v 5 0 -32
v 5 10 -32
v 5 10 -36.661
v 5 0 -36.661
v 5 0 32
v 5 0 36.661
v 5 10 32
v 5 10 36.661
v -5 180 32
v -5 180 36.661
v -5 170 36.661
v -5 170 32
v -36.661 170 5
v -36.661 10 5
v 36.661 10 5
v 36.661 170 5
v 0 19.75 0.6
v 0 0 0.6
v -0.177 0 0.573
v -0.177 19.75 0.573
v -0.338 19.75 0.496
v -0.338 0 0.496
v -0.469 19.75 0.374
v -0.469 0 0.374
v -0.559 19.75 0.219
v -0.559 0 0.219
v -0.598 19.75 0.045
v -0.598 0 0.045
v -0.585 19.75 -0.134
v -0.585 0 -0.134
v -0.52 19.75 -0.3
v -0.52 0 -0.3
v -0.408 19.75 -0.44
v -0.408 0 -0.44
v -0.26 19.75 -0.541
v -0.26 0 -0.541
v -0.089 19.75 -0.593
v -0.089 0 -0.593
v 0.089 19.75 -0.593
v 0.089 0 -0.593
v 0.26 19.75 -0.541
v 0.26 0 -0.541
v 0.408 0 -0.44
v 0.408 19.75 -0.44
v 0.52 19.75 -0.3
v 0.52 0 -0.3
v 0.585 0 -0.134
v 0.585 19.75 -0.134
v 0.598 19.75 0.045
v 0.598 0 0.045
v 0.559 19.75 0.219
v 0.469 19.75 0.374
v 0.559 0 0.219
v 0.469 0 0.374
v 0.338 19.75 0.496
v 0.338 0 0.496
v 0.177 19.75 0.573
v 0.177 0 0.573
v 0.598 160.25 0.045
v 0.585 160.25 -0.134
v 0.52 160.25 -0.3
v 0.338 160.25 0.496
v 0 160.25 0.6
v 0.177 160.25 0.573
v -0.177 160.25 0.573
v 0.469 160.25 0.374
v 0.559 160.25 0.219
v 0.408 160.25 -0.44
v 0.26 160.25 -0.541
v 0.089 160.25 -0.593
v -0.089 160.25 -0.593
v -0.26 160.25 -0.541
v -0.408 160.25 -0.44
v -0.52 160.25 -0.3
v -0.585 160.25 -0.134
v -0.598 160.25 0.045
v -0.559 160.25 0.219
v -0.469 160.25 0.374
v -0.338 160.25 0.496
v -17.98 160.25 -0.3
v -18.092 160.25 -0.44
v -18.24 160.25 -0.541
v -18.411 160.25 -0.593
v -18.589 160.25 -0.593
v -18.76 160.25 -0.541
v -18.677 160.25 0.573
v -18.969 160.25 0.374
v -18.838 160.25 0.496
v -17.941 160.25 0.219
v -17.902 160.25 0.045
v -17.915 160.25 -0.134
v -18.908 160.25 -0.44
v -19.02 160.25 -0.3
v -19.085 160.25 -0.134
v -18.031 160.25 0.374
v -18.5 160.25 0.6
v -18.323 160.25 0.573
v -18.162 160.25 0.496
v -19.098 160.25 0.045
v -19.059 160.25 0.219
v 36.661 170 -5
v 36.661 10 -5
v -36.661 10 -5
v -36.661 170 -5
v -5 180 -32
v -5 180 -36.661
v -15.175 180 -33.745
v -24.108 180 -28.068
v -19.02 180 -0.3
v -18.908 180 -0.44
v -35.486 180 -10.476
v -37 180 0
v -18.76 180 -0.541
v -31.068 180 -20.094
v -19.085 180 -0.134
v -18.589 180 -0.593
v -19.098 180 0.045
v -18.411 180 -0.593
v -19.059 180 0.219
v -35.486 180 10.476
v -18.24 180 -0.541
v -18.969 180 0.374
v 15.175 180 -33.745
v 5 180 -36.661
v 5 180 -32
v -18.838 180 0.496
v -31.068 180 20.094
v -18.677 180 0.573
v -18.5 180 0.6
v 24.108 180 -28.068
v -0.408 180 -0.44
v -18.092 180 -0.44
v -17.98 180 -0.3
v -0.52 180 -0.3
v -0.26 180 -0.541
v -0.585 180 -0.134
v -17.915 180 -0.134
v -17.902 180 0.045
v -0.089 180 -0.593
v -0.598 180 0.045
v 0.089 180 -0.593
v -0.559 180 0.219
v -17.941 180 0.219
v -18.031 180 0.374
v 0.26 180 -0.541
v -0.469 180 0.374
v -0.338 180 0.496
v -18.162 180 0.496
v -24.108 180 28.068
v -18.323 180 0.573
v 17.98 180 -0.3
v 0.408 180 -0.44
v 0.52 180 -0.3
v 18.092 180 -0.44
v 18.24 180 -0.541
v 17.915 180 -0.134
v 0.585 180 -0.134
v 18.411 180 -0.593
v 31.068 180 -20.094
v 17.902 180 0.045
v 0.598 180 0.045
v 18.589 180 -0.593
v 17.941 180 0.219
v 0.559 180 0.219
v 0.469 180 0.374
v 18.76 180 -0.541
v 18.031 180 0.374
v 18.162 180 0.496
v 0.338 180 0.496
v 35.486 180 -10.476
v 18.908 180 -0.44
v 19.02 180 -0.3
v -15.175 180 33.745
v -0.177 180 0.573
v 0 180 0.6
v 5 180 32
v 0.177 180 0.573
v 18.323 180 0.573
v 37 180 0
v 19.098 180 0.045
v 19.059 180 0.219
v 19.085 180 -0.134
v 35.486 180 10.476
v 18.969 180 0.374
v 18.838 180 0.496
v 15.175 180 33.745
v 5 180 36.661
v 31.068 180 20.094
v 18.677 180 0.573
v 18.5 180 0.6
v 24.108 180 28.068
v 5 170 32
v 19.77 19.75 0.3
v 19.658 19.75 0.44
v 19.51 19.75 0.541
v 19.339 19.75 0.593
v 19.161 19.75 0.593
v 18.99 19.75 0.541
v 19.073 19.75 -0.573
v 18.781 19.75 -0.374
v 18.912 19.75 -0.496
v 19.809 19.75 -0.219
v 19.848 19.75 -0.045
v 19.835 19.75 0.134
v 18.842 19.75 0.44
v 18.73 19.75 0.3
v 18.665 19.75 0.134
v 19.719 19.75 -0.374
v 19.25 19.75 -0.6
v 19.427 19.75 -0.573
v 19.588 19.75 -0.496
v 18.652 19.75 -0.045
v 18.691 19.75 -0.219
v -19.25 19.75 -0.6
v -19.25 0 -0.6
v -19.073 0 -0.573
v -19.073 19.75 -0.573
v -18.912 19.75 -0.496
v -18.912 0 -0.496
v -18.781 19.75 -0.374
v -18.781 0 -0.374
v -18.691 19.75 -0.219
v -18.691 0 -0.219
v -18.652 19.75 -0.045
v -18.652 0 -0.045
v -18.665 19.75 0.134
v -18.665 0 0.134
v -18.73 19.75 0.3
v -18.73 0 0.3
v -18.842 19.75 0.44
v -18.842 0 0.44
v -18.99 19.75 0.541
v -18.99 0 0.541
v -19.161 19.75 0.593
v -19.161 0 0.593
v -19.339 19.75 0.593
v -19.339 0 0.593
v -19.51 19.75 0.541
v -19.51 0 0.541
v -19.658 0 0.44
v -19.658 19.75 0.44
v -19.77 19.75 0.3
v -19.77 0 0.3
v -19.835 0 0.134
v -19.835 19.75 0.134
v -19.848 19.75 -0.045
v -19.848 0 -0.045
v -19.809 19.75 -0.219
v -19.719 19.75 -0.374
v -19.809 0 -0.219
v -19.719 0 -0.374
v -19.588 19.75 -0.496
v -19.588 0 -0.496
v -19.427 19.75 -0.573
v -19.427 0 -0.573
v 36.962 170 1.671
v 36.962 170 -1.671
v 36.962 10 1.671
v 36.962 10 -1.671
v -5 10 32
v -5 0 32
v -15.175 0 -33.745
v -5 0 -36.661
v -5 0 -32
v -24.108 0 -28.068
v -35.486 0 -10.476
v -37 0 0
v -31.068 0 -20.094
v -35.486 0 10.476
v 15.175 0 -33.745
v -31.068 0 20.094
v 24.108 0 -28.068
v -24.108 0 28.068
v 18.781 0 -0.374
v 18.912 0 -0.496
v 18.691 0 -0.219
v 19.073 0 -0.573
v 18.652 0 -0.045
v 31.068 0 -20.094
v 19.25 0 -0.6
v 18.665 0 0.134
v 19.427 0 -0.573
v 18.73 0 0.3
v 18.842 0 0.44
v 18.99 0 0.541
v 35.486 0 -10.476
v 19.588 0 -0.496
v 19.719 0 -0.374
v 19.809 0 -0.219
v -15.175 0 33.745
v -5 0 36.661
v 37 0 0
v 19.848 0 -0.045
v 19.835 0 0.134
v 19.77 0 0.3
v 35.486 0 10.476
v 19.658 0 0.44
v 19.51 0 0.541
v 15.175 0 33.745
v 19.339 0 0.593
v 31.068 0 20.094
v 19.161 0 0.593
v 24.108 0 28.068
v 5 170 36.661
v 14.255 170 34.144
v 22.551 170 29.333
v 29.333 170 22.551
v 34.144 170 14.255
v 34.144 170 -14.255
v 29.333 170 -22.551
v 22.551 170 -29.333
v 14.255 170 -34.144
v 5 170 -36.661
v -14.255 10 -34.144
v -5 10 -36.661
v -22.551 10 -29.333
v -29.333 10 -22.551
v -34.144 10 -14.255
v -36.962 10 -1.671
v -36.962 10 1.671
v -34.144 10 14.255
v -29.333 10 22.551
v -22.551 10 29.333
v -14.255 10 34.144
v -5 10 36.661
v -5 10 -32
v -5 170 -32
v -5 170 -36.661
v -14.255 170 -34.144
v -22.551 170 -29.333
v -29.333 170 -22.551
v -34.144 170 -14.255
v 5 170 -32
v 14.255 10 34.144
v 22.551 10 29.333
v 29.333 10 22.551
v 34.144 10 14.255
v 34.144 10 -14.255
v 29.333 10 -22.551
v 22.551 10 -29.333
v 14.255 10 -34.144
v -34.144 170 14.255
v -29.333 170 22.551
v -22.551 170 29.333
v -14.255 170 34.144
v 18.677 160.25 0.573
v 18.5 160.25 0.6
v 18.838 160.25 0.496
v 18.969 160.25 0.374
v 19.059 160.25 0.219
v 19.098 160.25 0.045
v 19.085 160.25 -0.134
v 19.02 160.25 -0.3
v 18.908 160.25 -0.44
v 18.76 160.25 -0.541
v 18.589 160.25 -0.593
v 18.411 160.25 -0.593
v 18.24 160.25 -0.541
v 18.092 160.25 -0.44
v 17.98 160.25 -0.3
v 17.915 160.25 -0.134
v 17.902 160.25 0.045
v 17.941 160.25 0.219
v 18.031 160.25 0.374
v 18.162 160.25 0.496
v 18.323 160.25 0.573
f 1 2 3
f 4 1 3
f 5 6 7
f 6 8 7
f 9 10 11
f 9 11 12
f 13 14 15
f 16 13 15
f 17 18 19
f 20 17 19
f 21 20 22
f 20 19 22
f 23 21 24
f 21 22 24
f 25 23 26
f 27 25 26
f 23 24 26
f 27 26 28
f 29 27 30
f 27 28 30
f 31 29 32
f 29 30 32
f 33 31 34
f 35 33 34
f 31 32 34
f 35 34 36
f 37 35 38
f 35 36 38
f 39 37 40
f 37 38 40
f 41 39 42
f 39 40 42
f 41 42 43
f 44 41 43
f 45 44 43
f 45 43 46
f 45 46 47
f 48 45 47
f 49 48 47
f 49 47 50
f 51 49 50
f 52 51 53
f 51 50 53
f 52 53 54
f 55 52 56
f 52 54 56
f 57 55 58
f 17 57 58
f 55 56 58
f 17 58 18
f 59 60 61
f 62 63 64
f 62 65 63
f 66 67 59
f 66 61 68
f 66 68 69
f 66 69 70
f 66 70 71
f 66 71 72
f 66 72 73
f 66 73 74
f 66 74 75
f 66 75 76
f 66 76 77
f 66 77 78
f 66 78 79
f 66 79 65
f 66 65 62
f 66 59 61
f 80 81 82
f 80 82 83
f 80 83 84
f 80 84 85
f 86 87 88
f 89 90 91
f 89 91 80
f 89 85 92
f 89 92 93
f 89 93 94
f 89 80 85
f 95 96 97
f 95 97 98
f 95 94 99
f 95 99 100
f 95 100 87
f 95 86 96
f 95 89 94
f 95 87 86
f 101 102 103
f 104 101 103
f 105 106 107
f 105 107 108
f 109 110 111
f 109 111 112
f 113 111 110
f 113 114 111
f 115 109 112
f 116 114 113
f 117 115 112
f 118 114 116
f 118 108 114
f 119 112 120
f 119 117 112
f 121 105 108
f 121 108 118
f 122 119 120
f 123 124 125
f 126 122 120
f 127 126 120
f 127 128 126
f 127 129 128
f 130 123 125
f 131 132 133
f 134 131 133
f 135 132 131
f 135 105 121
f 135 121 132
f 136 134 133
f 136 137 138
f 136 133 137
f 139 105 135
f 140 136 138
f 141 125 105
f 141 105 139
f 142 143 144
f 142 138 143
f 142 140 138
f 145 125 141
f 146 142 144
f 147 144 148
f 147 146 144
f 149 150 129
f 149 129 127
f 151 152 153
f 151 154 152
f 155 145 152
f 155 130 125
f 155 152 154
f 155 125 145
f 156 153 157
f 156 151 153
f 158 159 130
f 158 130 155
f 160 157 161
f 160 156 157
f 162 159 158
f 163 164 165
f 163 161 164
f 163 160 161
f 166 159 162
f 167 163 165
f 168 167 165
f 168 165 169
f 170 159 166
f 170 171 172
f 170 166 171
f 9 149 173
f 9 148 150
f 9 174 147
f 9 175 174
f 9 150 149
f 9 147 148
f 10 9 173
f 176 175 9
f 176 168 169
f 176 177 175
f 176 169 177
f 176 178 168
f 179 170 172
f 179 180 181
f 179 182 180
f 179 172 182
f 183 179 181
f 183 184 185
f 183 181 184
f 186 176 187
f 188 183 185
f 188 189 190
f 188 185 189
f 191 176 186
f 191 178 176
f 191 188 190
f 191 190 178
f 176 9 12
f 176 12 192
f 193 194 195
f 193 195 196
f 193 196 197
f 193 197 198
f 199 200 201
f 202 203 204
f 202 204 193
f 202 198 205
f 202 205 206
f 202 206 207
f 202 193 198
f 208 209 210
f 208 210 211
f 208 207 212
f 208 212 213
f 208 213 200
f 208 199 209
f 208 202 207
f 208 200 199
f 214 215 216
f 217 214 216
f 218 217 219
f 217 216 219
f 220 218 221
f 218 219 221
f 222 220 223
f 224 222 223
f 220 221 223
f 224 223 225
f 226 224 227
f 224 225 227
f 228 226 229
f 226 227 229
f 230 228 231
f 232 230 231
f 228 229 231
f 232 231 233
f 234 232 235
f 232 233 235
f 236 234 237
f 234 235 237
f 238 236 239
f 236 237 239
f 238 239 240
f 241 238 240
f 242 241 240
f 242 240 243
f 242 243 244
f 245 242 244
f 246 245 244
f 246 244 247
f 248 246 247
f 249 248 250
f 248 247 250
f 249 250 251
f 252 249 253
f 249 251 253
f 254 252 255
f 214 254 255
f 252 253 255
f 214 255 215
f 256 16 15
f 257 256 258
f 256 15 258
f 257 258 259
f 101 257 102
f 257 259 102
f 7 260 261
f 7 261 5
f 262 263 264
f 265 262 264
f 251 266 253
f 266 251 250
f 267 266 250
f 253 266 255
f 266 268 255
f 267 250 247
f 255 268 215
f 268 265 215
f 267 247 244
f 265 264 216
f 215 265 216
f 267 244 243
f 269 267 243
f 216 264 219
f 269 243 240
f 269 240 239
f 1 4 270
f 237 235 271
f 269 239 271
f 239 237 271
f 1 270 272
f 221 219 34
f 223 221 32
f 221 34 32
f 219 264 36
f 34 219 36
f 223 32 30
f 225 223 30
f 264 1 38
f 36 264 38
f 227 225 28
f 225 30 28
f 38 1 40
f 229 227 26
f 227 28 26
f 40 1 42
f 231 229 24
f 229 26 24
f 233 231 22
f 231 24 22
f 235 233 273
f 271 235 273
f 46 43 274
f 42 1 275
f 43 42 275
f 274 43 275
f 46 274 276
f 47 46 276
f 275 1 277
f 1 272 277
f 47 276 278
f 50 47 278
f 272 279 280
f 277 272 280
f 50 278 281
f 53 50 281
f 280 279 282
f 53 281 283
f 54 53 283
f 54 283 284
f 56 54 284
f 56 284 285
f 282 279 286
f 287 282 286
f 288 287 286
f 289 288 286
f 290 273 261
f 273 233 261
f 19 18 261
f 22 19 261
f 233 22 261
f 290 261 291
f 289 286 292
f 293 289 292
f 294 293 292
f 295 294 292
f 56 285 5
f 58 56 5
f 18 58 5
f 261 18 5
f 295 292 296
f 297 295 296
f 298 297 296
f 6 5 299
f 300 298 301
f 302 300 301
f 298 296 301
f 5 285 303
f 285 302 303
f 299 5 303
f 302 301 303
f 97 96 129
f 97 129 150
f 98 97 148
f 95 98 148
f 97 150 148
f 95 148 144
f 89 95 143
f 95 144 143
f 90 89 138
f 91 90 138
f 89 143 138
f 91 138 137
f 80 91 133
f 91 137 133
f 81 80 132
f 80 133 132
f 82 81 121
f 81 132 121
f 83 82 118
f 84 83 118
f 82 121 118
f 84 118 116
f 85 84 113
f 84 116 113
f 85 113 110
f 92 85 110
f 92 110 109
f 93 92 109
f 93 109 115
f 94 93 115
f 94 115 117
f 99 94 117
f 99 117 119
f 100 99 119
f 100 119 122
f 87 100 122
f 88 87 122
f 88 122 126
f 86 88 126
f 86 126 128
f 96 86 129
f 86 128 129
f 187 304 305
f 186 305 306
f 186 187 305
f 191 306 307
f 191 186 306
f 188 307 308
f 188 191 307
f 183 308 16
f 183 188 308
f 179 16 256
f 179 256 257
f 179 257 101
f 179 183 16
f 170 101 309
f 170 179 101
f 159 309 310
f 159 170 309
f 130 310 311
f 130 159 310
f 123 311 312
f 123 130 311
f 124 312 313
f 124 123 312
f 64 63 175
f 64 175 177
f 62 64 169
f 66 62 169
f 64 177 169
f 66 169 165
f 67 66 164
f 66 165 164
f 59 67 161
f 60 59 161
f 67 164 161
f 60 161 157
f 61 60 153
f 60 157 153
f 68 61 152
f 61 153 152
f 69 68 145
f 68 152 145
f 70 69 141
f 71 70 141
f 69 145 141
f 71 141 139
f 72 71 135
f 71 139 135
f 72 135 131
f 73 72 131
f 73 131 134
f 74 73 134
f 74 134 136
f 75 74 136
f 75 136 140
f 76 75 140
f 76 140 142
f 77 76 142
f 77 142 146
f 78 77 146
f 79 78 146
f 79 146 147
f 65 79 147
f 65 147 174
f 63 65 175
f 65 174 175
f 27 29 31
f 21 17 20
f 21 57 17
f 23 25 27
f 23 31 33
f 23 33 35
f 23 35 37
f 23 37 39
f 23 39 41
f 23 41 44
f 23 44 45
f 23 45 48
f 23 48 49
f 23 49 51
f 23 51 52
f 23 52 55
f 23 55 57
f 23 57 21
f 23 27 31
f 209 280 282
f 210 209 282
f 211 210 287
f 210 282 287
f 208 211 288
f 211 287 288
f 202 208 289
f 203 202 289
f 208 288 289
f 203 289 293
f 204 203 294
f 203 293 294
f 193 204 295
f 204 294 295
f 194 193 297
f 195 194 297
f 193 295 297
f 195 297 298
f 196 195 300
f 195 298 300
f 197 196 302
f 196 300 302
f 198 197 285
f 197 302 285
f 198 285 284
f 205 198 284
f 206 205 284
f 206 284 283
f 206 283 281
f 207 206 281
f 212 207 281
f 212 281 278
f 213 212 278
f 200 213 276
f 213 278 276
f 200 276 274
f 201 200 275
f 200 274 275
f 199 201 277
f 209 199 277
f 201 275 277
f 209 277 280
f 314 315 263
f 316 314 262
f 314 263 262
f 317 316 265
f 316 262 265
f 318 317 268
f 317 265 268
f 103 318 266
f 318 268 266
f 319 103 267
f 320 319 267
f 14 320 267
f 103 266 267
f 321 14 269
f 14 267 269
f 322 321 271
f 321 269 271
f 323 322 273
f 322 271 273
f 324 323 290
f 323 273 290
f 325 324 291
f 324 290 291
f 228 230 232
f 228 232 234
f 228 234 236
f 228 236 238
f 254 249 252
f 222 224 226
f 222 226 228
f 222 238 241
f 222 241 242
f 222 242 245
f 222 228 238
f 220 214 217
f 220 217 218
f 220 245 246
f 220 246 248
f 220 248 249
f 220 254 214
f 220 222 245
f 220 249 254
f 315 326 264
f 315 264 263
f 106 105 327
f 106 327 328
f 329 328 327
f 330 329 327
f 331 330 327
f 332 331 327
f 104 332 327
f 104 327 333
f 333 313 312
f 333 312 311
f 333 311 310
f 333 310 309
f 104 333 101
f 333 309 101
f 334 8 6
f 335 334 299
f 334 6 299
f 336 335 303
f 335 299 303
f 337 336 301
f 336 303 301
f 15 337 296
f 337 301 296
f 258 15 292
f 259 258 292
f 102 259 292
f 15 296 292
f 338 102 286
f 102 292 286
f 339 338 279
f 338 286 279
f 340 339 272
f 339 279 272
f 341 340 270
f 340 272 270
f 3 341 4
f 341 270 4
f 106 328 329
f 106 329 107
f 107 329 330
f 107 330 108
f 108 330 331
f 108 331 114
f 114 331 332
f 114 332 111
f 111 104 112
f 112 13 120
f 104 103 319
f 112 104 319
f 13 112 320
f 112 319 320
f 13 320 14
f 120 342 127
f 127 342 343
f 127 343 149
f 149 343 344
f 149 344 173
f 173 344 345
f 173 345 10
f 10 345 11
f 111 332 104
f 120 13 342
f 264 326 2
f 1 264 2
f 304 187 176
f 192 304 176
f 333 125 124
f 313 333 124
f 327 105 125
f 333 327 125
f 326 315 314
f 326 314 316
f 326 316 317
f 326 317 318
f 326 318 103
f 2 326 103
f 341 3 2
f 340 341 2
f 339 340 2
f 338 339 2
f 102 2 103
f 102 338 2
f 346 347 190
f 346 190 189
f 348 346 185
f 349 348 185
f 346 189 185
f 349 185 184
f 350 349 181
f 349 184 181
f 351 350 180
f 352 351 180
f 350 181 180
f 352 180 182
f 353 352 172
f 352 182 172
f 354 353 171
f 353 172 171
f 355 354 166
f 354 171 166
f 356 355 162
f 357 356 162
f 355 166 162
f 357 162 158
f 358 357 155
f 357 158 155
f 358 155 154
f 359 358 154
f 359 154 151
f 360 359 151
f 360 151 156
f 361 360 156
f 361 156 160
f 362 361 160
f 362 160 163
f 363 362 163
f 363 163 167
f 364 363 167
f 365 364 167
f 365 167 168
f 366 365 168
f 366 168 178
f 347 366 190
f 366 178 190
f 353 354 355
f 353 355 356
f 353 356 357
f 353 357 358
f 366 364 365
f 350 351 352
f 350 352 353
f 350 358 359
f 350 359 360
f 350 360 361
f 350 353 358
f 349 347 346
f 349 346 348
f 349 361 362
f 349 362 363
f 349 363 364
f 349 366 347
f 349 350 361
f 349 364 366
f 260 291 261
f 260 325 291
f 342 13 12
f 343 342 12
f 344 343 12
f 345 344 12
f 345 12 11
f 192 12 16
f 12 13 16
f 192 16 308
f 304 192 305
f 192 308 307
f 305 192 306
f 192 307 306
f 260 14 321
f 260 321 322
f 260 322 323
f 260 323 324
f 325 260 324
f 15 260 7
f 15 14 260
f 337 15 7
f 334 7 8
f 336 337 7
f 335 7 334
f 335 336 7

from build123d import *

# Parameters (mm, degrees)
SKETCH1_R           = 37
BOSS_EXTRUDE1_DEPTH = 10
SKETCH2_R           = 37
BOSS_EXTRUDE2_DEPTH = 10
BOSS_EXTRUDE3_REACH = 179.871
SKETCH4_W           = 10
SKETCH4_H           = 10
CUT_EXTRUDE1_DEPTH  = 188.451327016
SKETCH5_R           = 0.6
CUT_EXTRUDE2_DEPTH  = 19.75
SKETCH7_R           = 0.6
CUT_EXTRUDE4_DEPTH  = 19.75


with BuildPart() as part:
    # Sketch1 → Boss-Extrude1 (new body)
    with BuildSketch(Plane(origin=(0, 0, 0), x_dir=(1, 0, 0), z_dir=(0, 1, 0))):
        with Locations(Location((0, 0, 0), (0, 0, 270))):
            Circle(SKETCH1_R)
    extrude(amount=BOSS_EXTRUDE1_DEPTH)


with BuildPart() as body_2:
    # Sketch2 → Boss-Extrude2 (new body)
    with BuildSketch(Plane(origin=(0, 180, 0), x_dir=(1, 0, 0), z_dir=(0, 1, 0))):
        with Locations(Location((0, 0, 0), (0, 0, 270))):
            Circle(SKETCH2_R)
    extrude(amount=-BOSS_EXTRUDE2_DEPTH)

    # Sketch3 → Boss-Extrude3 (add, up to next)
    with BuildSketch(Plane(origin=(0, 10, 0), x_dir=(1, 0, 0), z_dir=(0, 1, 0)), mode=Mode.PRIVATE) as boss_extrude3_sk1:
        with BuildLine():
            Line((36.66060556, 5), (-36.66060556, 5))
            ThreePointArc((-36.66060556, 5), (-37, 0), (-36.66060556, -5))
            Line((-36.66060556, -5), (36.66060556, -5))
            ThreePointArc((36.66060556, -5), (37, 0), (36.66060556, 5))
        make_face()
    boss_extrude3_tool1 = extrude(boss_extrude3_sk1.sketch, amount=BOSS_EXTRUDE3_REACH, mode=Mode.PRIVATE) - body_2.part

    add(part.part)  # Boss-Extrude3 merges part
    add(boss_extrude3_tool1.solids().sort_by_distance((0, 10, 0))[0])

    # Sketch4 → Cut-Extrude1 (cut, through all)
    with BuildSketch(Plane(origin=(0, 180, 0), x_dir=(1, 0, 0), z_dir=(0, 1, 0))):
        with Locations((0, 37)):
            Rectangle(SKETCH4_W, SKETCH4_H)
        with Locations((0, -37)):
            Rectangle(SKETCH4_W, SKETCH4_H)
    extrude(amount=-CUT_EXTRUDE1_DEPTH, mode=Mode.SUBTRACT)

    # Sketch5 → Cut-Extrude2 (cut)
    with BuildSketch(Plane(origin=(0, 180, 0), x_dir=(1, 0, 0), z_dir=(0, 1, 0))):
        with Locations(Location((-18.5, 0, 0), (0, 0, 270))):
            Circle(SKETCH5_R)
        with Locations(Location((0, 0, 0), (0, 0, 270))):
            Circle(SKETCH5_R)
        with Locations(Location((18.5, 0, 0), (0, 0, 270))):
            Circle(SKETCH5_R)
    extrude(amount=-CUT_EXTRUDE2_DEPTH, mode=Mode.SUBTRACT)

    # Sketch7 → Cut-Extrude4 (cut)
    with BuildSketch(Plane.XZ):
        with Locations(Location((-19.25, 0, 0), (0, 0, 270))):
            Circle(SKETCH7_R)
        with Locations(Location((0, 0, 0), (0, 0, 90))):
            Circle(SKETCH7_R)
        with Locations(Location((19.25, 0, 0), (0, 0, 270))):
            Circle(SKETCH7_R)
    extrude(amount=-CUT_EXTRUDE4_DEPTH, mode=Mode.SUBTRACT)


solid = body_2.part
